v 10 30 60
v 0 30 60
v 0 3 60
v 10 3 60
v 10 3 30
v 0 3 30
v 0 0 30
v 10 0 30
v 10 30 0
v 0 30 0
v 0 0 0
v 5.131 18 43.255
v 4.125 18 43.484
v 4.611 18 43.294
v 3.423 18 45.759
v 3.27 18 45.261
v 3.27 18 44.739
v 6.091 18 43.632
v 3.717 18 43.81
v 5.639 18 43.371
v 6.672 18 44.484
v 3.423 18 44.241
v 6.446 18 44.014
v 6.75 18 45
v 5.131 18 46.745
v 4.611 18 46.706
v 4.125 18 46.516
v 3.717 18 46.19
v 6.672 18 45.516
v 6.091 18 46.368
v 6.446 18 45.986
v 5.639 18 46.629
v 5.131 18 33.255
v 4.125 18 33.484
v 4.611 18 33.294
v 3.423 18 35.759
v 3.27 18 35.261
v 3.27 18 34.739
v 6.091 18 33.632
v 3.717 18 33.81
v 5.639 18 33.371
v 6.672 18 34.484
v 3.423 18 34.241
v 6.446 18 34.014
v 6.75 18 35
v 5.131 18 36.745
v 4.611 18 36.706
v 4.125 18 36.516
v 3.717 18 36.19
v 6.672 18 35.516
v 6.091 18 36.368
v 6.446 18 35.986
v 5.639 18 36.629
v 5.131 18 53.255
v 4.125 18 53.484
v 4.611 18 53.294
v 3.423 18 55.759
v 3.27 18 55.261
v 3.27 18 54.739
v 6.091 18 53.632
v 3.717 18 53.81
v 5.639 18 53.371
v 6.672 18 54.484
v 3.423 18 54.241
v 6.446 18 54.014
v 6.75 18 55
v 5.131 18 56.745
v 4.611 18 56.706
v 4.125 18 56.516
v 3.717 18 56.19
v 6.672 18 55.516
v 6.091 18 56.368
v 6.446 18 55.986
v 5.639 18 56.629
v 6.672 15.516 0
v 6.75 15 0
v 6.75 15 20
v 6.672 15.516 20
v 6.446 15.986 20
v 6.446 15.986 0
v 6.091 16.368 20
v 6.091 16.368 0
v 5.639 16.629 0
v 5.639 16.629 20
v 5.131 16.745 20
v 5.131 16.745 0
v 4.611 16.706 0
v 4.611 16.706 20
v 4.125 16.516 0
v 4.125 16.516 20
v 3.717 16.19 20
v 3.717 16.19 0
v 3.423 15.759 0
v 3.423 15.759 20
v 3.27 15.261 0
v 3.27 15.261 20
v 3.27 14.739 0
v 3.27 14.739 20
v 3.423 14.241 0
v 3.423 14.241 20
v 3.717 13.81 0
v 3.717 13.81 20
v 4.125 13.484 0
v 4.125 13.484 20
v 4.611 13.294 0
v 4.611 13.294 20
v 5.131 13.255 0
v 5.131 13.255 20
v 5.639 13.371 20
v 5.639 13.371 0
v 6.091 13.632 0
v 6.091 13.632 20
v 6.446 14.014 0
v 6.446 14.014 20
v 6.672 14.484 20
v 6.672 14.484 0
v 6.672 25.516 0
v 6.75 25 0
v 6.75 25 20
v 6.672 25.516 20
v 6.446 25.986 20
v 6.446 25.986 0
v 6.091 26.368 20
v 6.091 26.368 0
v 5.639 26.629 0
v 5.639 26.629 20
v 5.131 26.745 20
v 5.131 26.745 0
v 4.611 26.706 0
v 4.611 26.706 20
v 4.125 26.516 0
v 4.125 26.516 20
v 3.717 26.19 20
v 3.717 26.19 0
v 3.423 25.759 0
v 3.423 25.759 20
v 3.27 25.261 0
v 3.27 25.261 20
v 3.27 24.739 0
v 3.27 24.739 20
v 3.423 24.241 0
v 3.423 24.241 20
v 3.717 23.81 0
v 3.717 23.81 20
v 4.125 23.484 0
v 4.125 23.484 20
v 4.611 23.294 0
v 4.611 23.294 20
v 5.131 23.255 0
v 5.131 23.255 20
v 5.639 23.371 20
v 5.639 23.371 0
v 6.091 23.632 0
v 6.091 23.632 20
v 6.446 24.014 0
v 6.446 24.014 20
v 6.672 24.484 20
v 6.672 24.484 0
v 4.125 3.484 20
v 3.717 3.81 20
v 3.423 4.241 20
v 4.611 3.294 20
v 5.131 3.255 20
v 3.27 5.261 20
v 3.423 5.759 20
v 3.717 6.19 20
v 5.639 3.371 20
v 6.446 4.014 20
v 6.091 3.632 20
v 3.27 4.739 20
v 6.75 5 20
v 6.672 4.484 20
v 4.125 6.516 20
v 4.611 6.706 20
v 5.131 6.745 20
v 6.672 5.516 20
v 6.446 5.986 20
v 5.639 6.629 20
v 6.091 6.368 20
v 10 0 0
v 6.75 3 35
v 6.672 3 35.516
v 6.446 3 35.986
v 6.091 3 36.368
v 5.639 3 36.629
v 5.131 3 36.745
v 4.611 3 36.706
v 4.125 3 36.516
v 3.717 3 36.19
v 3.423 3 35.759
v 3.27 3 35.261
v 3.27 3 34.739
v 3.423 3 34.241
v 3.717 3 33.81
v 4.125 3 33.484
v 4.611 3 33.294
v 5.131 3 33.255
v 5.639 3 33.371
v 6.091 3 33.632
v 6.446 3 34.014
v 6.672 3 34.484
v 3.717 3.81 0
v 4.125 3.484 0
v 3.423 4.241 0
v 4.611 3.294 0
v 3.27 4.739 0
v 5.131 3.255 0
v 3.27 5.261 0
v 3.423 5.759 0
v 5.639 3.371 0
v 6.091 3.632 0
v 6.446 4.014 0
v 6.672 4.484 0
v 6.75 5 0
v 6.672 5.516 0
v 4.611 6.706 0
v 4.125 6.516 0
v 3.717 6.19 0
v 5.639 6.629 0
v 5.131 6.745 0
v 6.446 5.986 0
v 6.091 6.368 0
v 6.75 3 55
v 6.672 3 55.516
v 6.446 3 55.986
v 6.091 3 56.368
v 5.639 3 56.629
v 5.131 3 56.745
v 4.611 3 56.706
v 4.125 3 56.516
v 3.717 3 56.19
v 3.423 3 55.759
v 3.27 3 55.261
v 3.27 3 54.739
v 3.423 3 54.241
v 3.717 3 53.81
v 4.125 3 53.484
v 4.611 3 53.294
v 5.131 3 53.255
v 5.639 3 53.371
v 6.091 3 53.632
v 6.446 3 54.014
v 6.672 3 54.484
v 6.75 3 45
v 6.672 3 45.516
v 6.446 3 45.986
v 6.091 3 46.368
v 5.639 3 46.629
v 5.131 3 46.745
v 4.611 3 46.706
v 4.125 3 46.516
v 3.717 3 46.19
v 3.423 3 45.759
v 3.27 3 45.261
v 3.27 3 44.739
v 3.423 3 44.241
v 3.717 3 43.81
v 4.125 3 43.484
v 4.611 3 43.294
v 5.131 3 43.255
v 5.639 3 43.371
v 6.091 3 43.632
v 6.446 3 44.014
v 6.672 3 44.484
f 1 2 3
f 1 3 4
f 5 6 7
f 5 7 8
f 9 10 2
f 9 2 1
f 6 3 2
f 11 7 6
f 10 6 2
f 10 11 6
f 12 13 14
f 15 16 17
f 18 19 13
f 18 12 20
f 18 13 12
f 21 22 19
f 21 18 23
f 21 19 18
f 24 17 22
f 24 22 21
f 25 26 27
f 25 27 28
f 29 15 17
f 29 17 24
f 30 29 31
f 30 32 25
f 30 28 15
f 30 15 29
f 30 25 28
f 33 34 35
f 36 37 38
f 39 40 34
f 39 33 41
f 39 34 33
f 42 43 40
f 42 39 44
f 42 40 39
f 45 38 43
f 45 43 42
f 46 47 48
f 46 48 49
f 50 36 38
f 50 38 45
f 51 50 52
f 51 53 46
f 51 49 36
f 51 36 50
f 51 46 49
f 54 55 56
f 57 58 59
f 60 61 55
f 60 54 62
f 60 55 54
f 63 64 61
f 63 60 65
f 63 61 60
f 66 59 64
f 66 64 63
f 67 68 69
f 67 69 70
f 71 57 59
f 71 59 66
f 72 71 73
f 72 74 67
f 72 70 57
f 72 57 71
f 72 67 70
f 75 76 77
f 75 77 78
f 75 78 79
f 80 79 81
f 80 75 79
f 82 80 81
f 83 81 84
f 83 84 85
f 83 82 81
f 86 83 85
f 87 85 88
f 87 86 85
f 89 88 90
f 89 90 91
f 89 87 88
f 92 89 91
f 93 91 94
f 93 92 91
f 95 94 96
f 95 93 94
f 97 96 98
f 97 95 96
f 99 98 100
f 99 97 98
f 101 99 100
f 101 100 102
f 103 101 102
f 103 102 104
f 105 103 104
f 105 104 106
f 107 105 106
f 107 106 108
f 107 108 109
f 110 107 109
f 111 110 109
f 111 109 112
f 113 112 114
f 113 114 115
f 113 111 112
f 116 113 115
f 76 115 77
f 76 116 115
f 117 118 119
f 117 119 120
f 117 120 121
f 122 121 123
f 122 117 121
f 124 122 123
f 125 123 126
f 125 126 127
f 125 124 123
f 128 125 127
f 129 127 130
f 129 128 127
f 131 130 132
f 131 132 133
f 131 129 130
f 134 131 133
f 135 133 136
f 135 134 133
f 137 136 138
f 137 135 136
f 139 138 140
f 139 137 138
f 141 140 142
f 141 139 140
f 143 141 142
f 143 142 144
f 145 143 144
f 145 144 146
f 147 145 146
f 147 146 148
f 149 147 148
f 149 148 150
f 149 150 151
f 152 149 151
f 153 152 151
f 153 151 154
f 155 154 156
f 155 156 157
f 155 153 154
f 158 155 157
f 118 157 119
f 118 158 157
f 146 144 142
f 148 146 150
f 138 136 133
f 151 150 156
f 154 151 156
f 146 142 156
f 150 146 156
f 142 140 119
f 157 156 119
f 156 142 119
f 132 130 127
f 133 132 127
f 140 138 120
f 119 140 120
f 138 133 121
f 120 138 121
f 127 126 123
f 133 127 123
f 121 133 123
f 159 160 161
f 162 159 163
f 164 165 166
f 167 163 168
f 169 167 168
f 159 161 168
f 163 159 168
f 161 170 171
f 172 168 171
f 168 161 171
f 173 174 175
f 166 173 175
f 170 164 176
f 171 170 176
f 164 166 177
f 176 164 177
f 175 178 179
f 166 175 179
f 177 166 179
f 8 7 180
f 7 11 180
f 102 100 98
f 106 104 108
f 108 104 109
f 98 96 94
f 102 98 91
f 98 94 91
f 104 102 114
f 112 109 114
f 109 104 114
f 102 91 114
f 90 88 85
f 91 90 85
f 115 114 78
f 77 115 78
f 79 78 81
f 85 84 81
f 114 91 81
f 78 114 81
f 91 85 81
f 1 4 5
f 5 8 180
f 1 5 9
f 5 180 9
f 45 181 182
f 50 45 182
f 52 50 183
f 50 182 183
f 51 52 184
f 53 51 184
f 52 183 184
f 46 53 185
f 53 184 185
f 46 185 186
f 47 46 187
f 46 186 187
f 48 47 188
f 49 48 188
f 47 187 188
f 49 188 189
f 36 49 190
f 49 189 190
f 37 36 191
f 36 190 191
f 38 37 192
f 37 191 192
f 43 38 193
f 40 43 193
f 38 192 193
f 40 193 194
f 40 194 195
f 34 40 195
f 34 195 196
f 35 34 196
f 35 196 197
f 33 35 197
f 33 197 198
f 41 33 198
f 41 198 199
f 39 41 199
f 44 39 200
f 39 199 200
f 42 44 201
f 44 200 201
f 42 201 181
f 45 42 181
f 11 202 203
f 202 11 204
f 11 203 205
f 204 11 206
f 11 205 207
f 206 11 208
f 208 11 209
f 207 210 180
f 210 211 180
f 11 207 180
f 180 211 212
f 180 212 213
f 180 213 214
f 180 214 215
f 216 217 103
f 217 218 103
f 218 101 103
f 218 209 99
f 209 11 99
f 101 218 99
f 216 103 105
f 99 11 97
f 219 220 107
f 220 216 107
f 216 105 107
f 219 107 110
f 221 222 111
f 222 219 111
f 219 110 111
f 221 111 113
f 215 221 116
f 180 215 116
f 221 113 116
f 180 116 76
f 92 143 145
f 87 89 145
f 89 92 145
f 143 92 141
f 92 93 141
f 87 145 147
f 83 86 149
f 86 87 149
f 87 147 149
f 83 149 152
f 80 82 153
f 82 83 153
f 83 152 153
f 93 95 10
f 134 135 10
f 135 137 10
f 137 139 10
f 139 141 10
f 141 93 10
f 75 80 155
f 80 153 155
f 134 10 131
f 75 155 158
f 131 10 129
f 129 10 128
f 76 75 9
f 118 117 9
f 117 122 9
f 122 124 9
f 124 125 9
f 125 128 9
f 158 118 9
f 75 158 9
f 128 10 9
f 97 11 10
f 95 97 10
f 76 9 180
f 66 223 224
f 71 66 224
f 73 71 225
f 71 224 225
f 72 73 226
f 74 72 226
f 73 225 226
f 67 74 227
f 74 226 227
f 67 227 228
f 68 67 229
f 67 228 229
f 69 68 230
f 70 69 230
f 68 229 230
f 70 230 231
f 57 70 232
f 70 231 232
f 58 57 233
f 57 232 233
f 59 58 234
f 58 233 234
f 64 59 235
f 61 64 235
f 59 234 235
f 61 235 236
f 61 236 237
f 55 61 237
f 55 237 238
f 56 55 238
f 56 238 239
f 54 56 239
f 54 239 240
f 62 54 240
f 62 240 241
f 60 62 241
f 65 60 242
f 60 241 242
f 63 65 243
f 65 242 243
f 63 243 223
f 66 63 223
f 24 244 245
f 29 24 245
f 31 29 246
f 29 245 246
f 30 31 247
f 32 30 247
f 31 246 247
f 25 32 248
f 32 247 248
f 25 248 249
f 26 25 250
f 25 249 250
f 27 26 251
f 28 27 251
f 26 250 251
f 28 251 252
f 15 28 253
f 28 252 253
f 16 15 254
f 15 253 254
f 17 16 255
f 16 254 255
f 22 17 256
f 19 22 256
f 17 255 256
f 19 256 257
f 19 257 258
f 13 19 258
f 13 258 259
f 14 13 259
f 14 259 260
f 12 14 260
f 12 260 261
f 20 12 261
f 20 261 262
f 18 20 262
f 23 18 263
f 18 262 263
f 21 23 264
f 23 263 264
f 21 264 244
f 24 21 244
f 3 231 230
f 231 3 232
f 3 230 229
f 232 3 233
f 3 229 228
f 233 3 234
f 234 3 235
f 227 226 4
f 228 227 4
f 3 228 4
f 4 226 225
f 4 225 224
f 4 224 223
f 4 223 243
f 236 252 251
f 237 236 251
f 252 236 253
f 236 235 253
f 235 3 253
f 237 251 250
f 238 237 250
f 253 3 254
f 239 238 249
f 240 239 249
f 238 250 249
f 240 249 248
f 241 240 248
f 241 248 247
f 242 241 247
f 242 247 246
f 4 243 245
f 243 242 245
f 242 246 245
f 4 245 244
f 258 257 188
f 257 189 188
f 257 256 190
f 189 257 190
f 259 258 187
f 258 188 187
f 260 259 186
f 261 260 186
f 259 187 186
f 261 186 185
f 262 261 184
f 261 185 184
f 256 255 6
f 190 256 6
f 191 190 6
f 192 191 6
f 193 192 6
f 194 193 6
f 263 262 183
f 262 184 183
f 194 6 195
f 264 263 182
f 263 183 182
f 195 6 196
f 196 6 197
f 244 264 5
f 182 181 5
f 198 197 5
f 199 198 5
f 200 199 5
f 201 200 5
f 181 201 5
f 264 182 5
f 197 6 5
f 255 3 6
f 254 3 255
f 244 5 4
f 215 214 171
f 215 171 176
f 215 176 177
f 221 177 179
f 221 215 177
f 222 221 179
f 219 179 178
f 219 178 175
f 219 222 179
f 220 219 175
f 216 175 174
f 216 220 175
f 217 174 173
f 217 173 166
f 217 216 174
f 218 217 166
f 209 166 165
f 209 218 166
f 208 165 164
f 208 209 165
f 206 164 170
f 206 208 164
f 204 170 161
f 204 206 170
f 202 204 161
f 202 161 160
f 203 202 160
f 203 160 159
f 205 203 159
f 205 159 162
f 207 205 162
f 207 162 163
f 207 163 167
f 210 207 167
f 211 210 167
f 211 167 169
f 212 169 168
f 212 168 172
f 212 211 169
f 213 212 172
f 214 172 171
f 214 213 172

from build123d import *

# Parameters (mm, degrees)
ESQUISSE1_W             = 10
ESQUISSE1_H             = 30
ESQUISSE1_R             = 1.75
BOSS_EXTRU_1_DEPTH      = 20
ESQUISSE2_W             = 10
ESQUISSE2_H             = 30
BOSS_EXTRU_2_DEPTH      = 10
ESQUISSE3_W             = 10
ESQUISSE3_H             = 27
BOSS_EXTRU_3_DEPTH      = 30
ESQUISSE4_R             = 1.75
ENL_V_MAT_EXTRU_1_DEPTH = 15


with BuildPart() as part:
    # Esquisse1 → Boss.-Extru.1 (new body)
    with BuildSketch(Plane.XY):
        with Locations((5, 15)):
            Rectangle(ESQUISSE1_W, ESQUISSE1_H)
        with Locations((5, 5)):
            Circle(ESQUISSE1_R, mode=Mode.SUBTRACT)
        with Locations((5, 15)):
            Circle(ESQUISSE1_R, mode=Mode.SUBTRACT)
        with Locations((5, 25)):
            Circle(ESQUISSE1_R, mode=Mode.SUBTRACT)
    extrude(amount=BOSS_EXTRU_1_DEPTH)

    # Esquisse2 → Boss.-Extru.2 (add)
    with BuildSketch(Plane.XY.offset(20)):
        with Locations((5, 15)):
            Rectangle(ESQUISSE2_W, ESQUISSE2_H)
    extrude(amount=BOSS_EXTRU_2_DEPTH)

    # Esquisse3 → Boss.-Extru.3 (add)
    with BuildSketch(Plane.XY.offset(30)):
        with Locations((5, 16.5)):
            Rectangle(ESQUISSE3_W, ESQUISSE3_H)
    extrude(amount=BOSS_EXTRU_3_DEPTH)

    # Esquisse4 → Enlèv. mat.-Extru.1 (cut)
    with BuildSketch(Plane(origin=(0, 3, 0), x_dir=(-1, 0, 0), z_dir=(0, -1, 0))):
        with Locations(Location((-5, -55, 0), (0, 0, 180))):
            Circle(ESQUISSE4_R)
        with Locations(Location((-5, -45, 0), (0, 0, 180))):
            Circle(ESQUISSE4_R)
        with Locations(Location((-5, -35, 0), (0, 0, 180))):
            Circle(ESQUISSE4_R)
    extrude(amount=-ENL_V_MAT_EXTRU_1_DEPTH, mode=Mode.SUBTRACT)


solid = part.part
